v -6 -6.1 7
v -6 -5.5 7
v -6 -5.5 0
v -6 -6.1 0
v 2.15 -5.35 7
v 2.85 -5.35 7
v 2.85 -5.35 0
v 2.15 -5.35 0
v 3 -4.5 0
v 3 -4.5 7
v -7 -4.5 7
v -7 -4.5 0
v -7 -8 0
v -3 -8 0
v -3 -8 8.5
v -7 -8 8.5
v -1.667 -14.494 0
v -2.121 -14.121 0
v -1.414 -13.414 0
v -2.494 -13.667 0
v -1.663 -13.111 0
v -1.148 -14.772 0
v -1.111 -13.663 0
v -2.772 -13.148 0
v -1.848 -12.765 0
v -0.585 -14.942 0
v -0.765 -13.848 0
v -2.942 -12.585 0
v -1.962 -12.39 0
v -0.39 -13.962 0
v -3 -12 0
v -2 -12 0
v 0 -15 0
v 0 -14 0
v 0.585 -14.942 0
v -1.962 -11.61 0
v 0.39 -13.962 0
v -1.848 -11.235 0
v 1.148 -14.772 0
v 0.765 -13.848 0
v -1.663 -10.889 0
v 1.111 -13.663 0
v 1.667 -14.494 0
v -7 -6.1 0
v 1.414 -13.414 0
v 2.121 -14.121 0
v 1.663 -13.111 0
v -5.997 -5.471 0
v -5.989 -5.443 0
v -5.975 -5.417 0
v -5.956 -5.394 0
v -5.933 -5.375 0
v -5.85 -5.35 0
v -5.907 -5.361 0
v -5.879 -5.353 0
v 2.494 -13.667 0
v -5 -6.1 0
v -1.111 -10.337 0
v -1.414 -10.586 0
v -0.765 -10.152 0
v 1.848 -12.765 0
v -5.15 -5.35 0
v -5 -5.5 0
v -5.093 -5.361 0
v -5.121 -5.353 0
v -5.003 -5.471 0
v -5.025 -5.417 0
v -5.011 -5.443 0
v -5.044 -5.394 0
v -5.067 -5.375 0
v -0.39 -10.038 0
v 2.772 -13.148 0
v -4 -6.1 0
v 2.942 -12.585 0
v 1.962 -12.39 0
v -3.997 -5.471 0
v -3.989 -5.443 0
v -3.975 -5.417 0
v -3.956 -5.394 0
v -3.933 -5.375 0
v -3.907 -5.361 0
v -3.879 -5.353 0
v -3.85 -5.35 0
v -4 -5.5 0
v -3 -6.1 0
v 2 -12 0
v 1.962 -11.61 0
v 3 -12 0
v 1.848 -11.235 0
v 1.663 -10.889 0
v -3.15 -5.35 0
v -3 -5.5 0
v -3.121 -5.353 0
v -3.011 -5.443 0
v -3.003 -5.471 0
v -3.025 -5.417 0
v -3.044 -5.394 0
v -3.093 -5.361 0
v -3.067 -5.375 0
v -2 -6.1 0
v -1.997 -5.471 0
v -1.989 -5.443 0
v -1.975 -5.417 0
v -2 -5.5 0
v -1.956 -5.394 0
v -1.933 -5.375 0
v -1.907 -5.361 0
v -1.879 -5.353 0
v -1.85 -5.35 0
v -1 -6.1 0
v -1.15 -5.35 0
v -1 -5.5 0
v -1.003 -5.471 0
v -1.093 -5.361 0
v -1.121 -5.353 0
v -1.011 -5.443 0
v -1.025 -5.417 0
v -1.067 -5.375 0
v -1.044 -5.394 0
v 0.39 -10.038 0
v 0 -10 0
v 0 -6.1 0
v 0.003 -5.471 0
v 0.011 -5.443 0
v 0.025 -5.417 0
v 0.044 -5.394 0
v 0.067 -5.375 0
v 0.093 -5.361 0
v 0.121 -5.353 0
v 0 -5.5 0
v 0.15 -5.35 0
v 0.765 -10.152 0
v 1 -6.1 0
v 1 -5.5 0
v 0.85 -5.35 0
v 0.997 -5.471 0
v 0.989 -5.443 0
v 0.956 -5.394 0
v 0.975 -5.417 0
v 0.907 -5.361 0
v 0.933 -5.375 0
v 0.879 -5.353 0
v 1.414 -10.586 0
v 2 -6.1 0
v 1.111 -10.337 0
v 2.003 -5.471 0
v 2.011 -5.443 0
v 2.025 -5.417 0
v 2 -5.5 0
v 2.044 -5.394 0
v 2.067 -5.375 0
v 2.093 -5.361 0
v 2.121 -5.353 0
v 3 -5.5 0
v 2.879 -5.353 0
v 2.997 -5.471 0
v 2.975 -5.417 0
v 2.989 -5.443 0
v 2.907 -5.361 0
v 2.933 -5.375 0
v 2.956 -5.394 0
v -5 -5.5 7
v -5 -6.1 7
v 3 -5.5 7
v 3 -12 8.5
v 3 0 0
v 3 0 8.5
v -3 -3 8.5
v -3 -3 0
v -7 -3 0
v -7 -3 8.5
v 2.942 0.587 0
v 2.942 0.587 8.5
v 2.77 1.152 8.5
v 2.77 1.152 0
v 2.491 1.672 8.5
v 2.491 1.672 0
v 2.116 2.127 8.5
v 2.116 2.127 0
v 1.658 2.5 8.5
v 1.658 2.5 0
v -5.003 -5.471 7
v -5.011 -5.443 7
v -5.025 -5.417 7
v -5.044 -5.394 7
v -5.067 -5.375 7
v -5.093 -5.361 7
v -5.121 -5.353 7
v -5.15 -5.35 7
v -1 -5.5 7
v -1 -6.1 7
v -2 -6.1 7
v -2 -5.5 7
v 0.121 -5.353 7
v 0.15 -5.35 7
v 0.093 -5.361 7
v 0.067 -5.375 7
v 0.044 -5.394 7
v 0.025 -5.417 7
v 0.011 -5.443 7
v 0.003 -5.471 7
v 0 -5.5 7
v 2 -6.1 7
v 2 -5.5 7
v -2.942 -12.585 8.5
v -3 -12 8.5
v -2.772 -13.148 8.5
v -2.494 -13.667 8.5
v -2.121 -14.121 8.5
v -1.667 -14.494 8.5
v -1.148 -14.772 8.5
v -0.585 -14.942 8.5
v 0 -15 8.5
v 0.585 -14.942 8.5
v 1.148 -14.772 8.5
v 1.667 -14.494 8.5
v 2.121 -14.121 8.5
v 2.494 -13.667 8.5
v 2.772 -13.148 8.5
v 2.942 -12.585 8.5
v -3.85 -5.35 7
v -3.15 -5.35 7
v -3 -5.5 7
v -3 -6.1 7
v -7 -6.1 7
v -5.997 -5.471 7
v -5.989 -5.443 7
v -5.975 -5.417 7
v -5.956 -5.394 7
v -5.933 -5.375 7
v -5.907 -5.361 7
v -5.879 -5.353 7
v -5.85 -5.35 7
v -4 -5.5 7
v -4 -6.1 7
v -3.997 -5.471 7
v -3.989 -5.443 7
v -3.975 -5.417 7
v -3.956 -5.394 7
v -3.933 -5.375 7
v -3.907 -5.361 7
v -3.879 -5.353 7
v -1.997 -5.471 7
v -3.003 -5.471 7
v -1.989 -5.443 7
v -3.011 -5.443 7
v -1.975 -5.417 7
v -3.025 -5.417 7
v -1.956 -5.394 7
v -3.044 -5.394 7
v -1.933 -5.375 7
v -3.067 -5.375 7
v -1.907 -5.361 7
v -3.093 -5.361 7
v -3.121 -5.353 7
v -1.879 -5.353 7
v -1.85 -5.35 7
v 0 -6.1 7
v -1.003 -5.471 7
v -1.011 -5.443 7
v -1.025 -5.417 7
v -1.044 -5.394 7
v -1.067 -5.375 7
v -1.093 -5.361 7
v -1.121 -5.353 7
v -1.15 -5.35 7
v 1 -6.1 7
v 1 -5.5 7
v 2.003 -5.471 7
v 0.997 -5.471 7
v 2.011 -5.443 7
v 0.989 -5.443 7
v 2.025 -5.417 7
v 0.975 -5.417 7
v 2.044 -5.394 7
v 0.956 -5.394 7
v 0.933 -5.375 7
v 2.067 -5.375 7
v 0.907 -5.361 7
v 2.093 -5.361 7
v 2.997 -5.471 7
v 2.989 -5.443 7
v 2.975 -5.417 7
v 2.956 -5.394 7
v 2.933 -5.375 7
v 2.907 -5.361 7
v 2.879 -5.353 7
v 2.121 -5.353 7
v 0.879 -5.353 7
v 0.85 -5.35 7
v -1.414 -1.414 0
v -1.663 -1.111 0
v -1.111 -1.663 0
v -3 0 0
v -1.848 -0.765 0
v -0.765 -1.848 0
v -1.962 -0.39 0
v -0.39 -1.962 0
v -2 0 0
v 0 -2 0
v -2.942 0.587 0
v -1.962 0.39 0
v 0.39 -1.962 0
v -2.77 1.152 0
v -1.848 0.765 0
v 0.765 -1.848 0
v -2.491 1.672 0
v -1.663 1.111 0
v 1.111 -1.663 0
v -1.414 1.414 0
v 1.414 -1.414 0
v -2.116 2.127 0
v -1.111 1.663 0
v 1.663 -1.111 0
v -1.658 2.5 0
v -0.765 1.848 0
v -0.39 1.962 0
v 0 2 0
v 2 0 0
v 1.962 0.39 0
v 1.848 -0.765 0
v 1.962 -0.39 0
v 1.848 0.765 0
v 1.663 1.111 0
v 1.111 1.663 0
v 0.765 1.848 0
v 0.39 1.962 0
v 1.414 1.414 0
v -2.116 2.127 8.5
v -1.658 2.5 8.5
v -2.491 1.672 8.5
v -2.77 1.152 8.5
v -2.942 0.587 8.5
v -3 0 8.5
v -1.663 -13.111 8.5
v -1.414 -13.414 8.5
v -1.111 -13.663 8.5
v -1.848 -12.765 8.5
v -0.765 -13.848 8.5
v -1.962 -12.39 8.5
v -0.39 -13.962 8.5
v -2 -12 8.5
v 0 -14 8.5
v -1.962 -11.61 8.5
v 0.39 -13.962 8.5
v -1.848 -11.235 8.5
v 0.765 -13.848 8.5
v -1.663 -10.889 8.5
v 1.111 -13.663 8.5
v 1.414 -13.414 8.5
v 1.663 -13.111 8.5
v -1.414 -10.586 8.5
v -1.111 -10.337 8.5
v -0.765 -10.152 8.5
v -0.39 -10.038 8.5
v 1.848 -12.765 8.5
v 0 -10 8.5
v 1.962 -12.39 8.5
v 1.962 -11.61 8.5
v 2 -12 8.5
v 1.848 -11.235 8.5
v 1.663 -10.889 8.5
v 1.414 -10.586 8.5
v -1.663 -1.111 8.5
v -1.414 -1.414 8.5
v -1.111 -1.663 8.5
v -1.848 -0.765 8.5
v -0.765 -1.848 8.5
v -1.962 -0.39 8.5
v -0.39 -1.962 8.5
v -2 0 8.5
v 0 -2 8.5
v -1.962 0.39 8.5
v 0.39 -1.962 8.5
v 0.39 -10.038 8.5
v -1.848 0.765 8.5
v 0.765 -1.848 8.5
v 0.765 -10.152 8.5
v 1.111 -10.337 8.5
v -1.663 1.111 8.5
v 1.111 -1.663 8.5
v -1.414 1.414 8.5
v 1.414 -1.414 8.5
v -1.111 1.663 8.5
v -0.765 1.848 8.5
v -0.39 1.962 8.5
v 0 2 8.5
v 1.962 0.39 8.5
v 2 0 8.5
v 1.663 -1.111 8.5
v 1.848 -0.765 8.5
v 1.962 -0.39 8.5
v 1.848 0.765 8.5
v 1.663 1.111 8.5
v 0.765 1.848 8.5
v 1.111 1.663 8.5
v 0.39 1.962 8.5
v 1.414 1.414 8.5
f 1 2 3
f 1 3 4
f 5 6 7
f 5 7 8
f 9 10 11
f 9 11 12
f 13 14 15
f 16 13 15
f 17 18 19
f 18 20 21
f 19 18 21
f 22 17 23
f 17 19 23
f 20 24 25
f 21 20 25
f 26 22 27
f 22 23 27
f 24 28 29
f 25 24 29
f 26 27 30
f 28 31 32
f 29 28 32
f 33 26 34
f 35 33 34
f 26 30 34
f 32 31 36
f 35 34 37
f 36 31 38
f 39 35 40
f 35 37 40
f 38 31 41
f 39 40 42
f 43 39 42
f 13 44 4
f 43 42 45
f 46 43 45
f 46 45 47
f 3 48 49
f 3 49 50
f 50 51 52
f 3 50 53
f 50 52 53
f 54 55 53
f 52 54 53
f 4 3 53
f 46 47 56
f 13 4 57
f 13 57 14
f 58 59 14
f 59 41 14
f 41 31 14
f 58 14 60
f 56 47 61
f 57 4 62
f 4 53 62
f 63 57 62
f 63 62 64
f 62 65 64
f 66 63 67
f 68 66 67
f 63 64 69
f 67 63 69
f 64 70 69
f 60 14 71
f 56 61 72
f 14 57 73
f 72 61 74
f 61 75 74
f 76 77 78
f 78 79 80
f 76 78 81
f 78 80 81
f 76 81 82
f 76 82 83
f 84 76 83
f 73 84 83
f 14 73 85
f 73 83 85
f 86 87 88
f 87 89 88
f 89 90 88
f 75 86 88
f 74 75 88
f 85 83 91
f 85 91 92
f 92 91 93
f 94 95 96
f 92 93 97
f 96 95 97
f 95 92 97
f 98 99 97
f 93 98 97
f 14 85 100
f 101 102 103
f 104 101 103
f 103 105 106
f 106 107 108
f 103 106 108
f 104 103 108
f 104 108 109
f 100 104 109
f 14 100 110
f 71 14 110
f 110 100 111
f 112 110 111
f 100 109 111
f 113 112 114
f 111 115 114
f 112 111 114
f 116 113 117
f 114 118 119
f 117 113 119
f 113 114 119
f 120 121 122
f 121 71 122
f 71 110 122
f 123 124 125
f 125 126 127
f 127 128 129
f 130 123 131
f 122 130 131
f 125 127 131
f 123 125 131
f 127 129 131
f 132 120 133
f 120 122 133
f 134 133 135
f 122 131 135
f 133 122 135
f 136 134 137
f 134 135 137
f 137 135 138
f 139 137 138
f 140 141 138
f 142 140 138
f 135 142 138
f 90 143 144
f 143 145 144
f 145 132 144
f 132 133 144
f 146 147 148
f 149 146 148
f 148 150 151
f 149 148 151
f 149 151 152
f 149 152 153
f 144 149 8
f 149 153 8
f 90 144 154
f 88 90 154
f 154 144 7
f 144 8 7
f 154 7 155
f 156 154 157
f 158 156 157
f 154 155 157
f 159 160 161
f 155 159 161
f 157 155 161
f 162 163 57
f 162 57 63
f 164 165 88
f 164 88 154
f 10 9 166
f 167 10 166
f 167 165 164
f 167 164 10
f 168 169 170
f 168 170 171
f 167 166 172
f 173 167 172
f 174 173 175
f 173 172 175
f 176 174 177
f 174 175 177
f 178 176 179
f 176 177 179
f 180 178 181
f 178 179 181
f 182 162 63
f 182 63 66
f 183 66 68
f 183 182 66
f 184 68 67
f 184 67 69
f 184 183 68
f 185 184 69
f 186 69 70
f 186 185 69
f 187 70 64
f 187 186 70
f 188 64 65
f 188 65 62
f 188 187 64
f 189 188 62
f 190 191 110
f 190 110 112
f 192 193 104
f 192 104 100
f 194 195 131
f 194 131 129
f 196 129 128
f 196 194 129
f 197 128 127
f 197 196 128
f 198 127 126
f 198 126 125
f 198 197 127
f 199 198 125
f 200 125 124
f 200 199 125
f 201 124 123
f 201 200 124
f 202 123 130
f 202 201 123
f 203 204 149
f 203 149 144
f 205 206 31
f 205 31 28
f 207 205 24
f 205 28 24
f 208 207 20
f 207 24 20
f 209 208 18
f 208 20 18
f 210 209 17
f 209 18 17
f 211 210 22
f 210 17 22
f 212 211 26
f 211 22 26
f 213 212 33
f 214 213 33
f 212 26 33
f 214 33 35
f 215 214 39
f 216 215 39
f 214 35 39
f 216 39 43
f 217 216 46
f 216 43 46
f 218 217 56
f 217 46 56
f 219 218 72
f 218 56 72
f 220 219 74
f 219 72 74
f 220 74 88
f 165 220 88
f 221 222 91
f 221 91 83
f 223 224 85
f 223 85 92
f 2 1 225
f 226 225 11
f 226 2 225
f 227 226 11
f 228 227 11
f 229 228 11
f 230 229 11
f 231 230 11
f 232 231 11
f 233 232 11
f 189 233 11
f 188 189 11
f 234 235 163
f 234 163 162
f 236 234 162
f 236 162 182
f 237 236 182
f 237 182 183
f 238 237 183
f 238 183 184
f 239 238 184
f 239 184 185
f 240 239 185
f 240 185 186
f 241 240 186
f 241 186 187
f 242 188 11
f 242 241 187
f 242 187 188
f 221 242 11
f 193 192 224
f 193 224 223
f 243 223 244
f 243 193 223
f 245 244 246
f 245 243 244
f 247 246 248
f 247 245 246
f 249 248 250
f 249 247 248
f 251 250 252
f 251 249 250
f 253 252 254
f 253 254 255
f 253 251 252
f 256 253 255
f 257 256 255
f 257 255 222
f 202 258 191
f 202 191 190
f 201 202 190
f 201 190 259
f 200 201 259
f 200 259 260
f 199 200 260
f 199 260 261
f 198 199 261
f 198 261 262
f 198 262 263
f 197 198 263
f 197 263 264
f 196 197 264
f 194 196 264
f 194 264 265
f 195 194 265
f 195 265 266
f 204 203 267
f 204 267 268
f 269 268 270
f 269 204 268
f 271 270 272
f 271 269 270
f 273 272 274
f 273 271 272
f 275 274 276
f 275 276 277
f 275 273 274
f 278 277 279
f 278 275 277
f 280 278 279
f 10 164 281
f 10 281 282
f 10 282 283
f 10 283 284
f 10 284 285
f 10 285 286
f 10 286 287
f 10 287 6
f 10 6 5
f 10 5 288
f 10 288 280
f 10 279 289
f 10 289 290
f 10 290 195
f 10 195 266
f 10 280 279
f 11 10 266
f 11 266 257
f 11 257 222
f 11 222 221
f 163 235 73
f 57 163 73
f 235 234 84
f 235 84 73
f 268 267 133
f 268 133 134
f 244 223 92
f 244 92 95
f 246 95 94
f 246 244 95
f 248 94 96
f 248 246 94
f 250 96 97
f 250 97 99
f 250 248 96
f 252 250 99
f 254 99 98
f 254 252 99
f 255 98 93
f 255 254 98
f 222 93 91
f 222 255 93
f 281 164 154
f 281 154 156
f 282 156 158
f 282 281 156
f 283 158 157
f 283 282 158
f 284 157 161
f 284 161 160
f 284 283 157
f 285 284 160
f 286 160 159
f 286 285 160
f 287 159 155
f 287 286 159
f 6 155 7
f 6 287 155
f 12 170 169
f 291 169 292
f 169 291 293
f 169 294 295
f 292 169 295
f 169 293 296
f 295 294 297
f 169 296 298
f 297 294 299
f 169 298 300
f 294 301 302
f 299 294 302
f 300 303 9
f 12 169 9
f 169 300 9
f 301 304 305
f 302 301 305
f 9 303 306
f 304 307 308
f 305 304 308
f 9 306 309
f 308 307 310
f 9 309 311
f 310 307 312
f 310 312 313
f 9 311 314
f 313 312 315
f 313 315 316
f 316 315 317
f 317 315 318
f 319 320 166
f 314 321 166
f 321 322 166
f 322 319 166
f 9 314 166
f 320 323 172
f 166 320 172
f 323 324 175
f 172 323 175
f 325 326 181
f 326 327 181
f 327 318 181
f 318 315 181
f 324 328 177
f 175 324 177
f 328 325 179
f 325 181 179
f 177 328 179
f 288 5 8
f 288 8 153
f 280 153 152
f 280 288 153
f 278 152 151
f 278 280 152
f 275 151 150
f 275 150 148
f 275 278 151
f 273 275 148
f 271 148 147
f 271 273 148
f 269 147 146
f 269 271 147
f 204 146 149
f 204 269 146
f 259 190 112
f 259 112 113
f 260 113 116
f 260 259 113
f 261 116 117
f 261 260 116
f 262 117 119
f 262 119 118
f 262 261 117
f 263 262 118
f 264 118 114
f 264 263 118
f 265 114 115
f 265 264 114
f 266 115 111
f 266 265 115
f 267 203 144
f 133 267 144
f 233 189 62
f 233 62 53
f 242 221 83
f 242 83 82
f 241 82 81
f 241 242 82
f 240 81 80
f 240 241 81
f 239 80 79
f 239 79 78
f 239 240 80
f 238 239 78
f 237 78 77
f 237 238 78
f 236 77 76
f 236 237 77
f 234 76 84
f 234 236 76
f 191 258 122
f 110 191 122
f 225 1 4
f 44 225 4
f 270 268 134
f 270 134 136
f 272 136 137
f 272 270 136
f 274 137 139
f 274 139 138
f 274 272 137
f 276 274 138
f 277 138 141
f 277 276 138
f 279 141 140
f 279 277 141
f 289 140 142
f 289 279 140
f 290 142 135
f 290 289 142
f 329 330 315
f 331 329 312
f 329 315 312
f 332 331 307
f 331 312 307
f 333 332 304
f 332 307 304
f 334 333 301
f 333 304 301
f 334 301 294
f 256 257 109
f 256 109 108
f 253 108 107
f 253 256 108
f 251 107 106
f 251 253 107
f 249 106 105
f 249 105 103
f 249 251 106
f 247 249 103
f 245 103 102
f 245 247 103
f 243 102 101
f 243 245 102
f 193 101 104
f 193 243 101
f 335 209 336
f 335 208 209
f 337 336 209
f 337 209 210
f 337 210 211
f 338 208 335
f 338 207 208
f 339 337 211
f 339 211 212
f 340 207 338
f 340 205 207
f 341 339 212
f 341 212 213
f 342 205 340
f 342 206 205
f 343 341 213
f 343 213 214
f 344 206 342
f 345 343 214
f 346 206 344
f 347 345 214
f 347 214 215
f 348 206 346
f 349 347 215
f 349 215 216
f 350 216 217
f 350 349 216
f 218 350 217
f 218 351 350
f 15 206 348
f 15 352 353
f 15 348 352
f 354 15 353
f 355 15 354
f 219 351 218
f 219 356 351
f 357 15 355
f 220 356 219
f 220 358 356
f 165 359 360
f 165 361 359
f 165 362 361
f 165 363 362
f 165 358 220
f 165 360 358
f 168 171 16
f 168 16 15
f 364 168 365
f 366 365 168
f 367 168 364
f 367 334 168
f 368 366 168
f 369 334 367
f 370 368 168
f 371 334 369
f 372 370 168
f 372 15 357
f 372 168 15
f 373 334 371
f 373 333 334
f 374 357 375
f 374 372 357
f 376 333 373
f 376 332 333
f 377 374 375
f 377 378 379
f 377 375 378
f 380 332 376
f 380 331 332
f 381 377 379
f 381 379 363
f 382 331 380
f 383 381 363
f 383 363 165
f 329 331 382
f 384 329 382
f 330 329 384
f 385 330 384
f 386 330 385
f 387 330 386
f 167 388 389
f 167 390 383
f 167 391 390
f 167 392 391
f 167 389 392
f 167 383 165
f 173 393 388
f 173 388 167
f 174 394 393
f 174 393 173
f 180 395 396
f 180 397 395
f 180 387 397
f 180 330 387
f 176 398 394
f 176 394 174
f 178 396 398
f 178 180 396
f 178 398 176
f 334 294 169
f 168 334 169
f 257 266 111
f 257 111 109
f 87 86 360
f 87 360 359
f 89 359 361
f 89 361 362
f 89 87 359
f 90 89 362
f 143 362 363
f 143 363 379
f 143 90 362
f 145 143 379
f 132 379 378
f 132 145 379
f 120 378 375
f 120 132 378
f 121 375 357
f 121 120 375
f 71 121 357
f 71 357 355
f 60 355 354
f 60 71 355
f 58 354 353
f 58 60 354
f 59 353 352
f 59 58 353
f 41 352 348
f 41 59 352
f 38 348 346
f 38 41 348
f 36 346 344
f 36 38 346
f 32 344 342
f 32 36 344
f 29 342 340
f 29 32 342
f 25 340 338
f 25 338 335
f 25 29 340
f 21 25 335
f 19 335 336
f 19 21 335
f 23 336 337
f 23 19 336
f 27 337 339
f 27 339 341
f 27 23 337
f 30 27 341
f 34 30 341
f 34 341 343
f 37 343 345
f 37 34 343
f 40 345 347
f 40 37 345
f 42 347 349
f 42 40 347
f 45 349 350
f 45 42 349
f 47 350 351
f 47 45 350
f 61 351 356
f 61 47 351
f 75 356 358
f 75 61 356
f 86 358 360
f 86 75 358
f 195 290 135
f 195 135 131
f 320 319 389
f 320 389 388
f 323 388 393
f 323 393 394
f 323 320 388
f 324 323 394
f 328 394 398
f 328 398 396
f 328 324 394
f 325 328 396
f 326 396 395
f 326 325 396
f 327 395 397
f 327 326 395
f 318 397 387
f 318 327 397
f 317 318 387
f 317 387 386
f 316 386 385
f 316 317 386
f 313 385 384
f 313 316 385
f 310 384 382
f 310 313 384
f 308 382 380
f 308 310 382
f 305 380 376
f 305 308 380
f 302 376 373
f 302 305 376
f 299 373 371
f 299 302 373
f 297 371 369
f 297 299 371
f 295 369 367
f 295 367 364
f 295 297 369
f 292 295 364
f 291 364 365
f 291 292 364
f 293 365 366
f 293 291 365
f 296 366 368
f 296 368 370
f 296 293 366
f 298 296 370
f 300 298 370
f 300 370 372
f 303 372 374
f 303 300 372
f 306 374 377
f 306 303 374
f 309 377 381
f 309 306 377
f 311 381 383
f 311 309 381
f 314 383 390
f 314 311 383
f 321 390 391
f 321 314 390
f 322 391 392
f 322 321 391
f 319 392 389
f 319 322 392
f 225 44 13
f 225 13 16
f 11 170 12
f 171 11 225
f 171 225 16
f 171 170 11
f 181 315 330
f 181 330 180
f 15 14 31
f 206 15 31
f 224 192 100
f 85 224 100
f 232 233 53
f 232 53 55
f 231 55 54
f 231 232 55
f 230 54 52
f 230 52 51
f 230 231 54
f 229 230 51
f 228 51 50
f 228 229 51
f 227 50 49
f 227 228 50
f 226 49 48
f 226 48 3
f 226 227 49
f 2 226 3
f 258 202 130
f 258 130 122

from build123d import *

# Parameters (mm, degrees)
SKETCH1_R           = 2
BOSS_EXTRUDE1_DEPTH = 8.5
SKETCH9_W           = 8.5
SKETCH9_H           = 5
BOSS_EXTRUDE4_DEPTH = 4
SKETCH6_W           = 7
SKETCH6_H           = 1.6
CUT_EXTRUDE5_DEPTH  = 20.931131428
BOSS_EXTRUDE3_DEPTH = 7
SKETCH10_W          = 5
SKETCH10_H          = 1
CUT_EXTRUDE6_DEPTH  = 19.607794066


with BuildPart() as part:
    # Sketch1 → Boss-Extrude1 (new body)
    with BuildSketch(Plane.XY):
        with BuildLine():
            Line((-3, 0), (-3, -12))
            ThreePointArc((-3, -12), (0, -15), (3, -12))
            Line((3, -12), (3, 0))
            ThreePointArc((3, 0), (0, 3), (-3, 0))
        make_face()
        Circle(SKETCH1_R, mode=Mode.SUBTRACT)
        with Locations((0, -12)):
            Circle(SKETCH1_R, mode=Mode.SUBTRACT)
    extrude(amount=BOSS_EXTRUDE1_DEPTH)

    # Sketch9 → Boss-Extrude4 (add)
    with BuildSketch(Plane.ZY.offset(3)):
        with Locations((4.25, -5.5)):
            Rectangle(SKETCH9_W, SKETCH9_H)
    extrude(amount=BOSS_EXTRUDE4_DEPTH)

    # Sketch6 → Cut-Extrude5 (cut, through all)
    with BuildSketch(Plane(origin=(3, 0, 0), x_dir=(0, 0, -1), z_dir=(1, 0, 0))):
        with Locations((-3.5, -5.3)):
            Rectangle(SKETCH6_W, SKETCH6_H)
    extrude(amount=-CUT_EXTRUDE5_DEPTH, mode=Mode.SUBTRACT)

    # Sketch7 → Boss-Extrude3 (add, through all)
    with BuildSketch(Plane(origin=(0, 0, 7), x_dir=(-1, 0, 0), z_dir=(0, 0, -1))):
        with BuildLine():
            Line((-3, -6.1), (-3, -5.5))
            ThreePointArc((-3, -5.5), (-2.956066017, -5.393933983), (-2.85, -5.35))
            Line((-2.85, -5.35), (-2.15, -5.35))
            ThreePointArc((-2.15, -5.35), (-2.043933983, -5.393933983), (-2, -5.5))
            Line((-2, -5.5), (-2, -6.1))
            Line((-2, -6.1), (-3, -6.1))
        make_face()
        with BuildLine():
            Line((-0.85, -5.35), (-0.15, -5.35))
            ThreePointArc((-0.15, -5.35), (-0.043933983, -5.393933983), (0, -5.5))
            Line((0, -5.5), (0, -6.1))
            Line((0, -6.1), (-1, -6.1))
            Line((-1, -6.1), (-1, -5.5))
            ThreePointArc((-1, -5.5), (-0.956066017, -5.393933983), (-0.85, -5.35))
        make_face()
        with BuildLine():
            Line((1.15, -5.35), (1.85, -5.35))
            ThreePointArc((1.85, -5.35), (1.956066017, -5.393933983), (2, -5.5))
            Line((2, -5.5), (2, -6.1))
            Line((2, -6.1), (1, -6.1))
            Line((1, -6.1), (1, -5.5))
            ThreePointArc((1, -5.5), (1.043933983, -5.393933983), (1.15, -5.35))
        make_face()
        with BuildLine():
            Line((3.15, -5.35), (3.85, -5.35))
            ThreePointArc((3.85, -5.35), (3.956066017, -5.393933983), (4, -5.5))
            Line((4, -5.5), (4, -6.1))
            Line((4, -6.1), (3, -6.1))
            Line((3, -6.1), (3, -5.5))
            ThreePointArc((3, -5.5), (3.043933983, -5.393933983), (3.15, -5.35))
        make_face()
        with BuildLine():
            Line((5.15, -5.35), (5.85, -5.35))
            ThreePointArc((5.85, -5.35), (5.956066017, -5.393933983), (6, -5.5))
            Line((6, -5.5), (6, -6.1))
            Line((6, -6.1), (5, -6.1))
            Line((5, -6.1), (5, -5.5))
            ThreePointArc((5, -5.5), (5.043933983, -5.393933983), (5.15, -5.35))
        make_face()
    extrude(amount=BOSS_EXTRUDE3_DEPTH)

    # Sketch10 → Cut-Extrude6 (cut, through all)
    with BuildSketch(Plane.XY.offset(8.5)):
        with Locations((0, 3)):
            Rectangle(SKETCH10_W, SKETCH10_H)
    extrude(amount=-CUT_EXTRUDE6_DEPTH, mode=Mode.SUBTRACT)


solid = part.part
